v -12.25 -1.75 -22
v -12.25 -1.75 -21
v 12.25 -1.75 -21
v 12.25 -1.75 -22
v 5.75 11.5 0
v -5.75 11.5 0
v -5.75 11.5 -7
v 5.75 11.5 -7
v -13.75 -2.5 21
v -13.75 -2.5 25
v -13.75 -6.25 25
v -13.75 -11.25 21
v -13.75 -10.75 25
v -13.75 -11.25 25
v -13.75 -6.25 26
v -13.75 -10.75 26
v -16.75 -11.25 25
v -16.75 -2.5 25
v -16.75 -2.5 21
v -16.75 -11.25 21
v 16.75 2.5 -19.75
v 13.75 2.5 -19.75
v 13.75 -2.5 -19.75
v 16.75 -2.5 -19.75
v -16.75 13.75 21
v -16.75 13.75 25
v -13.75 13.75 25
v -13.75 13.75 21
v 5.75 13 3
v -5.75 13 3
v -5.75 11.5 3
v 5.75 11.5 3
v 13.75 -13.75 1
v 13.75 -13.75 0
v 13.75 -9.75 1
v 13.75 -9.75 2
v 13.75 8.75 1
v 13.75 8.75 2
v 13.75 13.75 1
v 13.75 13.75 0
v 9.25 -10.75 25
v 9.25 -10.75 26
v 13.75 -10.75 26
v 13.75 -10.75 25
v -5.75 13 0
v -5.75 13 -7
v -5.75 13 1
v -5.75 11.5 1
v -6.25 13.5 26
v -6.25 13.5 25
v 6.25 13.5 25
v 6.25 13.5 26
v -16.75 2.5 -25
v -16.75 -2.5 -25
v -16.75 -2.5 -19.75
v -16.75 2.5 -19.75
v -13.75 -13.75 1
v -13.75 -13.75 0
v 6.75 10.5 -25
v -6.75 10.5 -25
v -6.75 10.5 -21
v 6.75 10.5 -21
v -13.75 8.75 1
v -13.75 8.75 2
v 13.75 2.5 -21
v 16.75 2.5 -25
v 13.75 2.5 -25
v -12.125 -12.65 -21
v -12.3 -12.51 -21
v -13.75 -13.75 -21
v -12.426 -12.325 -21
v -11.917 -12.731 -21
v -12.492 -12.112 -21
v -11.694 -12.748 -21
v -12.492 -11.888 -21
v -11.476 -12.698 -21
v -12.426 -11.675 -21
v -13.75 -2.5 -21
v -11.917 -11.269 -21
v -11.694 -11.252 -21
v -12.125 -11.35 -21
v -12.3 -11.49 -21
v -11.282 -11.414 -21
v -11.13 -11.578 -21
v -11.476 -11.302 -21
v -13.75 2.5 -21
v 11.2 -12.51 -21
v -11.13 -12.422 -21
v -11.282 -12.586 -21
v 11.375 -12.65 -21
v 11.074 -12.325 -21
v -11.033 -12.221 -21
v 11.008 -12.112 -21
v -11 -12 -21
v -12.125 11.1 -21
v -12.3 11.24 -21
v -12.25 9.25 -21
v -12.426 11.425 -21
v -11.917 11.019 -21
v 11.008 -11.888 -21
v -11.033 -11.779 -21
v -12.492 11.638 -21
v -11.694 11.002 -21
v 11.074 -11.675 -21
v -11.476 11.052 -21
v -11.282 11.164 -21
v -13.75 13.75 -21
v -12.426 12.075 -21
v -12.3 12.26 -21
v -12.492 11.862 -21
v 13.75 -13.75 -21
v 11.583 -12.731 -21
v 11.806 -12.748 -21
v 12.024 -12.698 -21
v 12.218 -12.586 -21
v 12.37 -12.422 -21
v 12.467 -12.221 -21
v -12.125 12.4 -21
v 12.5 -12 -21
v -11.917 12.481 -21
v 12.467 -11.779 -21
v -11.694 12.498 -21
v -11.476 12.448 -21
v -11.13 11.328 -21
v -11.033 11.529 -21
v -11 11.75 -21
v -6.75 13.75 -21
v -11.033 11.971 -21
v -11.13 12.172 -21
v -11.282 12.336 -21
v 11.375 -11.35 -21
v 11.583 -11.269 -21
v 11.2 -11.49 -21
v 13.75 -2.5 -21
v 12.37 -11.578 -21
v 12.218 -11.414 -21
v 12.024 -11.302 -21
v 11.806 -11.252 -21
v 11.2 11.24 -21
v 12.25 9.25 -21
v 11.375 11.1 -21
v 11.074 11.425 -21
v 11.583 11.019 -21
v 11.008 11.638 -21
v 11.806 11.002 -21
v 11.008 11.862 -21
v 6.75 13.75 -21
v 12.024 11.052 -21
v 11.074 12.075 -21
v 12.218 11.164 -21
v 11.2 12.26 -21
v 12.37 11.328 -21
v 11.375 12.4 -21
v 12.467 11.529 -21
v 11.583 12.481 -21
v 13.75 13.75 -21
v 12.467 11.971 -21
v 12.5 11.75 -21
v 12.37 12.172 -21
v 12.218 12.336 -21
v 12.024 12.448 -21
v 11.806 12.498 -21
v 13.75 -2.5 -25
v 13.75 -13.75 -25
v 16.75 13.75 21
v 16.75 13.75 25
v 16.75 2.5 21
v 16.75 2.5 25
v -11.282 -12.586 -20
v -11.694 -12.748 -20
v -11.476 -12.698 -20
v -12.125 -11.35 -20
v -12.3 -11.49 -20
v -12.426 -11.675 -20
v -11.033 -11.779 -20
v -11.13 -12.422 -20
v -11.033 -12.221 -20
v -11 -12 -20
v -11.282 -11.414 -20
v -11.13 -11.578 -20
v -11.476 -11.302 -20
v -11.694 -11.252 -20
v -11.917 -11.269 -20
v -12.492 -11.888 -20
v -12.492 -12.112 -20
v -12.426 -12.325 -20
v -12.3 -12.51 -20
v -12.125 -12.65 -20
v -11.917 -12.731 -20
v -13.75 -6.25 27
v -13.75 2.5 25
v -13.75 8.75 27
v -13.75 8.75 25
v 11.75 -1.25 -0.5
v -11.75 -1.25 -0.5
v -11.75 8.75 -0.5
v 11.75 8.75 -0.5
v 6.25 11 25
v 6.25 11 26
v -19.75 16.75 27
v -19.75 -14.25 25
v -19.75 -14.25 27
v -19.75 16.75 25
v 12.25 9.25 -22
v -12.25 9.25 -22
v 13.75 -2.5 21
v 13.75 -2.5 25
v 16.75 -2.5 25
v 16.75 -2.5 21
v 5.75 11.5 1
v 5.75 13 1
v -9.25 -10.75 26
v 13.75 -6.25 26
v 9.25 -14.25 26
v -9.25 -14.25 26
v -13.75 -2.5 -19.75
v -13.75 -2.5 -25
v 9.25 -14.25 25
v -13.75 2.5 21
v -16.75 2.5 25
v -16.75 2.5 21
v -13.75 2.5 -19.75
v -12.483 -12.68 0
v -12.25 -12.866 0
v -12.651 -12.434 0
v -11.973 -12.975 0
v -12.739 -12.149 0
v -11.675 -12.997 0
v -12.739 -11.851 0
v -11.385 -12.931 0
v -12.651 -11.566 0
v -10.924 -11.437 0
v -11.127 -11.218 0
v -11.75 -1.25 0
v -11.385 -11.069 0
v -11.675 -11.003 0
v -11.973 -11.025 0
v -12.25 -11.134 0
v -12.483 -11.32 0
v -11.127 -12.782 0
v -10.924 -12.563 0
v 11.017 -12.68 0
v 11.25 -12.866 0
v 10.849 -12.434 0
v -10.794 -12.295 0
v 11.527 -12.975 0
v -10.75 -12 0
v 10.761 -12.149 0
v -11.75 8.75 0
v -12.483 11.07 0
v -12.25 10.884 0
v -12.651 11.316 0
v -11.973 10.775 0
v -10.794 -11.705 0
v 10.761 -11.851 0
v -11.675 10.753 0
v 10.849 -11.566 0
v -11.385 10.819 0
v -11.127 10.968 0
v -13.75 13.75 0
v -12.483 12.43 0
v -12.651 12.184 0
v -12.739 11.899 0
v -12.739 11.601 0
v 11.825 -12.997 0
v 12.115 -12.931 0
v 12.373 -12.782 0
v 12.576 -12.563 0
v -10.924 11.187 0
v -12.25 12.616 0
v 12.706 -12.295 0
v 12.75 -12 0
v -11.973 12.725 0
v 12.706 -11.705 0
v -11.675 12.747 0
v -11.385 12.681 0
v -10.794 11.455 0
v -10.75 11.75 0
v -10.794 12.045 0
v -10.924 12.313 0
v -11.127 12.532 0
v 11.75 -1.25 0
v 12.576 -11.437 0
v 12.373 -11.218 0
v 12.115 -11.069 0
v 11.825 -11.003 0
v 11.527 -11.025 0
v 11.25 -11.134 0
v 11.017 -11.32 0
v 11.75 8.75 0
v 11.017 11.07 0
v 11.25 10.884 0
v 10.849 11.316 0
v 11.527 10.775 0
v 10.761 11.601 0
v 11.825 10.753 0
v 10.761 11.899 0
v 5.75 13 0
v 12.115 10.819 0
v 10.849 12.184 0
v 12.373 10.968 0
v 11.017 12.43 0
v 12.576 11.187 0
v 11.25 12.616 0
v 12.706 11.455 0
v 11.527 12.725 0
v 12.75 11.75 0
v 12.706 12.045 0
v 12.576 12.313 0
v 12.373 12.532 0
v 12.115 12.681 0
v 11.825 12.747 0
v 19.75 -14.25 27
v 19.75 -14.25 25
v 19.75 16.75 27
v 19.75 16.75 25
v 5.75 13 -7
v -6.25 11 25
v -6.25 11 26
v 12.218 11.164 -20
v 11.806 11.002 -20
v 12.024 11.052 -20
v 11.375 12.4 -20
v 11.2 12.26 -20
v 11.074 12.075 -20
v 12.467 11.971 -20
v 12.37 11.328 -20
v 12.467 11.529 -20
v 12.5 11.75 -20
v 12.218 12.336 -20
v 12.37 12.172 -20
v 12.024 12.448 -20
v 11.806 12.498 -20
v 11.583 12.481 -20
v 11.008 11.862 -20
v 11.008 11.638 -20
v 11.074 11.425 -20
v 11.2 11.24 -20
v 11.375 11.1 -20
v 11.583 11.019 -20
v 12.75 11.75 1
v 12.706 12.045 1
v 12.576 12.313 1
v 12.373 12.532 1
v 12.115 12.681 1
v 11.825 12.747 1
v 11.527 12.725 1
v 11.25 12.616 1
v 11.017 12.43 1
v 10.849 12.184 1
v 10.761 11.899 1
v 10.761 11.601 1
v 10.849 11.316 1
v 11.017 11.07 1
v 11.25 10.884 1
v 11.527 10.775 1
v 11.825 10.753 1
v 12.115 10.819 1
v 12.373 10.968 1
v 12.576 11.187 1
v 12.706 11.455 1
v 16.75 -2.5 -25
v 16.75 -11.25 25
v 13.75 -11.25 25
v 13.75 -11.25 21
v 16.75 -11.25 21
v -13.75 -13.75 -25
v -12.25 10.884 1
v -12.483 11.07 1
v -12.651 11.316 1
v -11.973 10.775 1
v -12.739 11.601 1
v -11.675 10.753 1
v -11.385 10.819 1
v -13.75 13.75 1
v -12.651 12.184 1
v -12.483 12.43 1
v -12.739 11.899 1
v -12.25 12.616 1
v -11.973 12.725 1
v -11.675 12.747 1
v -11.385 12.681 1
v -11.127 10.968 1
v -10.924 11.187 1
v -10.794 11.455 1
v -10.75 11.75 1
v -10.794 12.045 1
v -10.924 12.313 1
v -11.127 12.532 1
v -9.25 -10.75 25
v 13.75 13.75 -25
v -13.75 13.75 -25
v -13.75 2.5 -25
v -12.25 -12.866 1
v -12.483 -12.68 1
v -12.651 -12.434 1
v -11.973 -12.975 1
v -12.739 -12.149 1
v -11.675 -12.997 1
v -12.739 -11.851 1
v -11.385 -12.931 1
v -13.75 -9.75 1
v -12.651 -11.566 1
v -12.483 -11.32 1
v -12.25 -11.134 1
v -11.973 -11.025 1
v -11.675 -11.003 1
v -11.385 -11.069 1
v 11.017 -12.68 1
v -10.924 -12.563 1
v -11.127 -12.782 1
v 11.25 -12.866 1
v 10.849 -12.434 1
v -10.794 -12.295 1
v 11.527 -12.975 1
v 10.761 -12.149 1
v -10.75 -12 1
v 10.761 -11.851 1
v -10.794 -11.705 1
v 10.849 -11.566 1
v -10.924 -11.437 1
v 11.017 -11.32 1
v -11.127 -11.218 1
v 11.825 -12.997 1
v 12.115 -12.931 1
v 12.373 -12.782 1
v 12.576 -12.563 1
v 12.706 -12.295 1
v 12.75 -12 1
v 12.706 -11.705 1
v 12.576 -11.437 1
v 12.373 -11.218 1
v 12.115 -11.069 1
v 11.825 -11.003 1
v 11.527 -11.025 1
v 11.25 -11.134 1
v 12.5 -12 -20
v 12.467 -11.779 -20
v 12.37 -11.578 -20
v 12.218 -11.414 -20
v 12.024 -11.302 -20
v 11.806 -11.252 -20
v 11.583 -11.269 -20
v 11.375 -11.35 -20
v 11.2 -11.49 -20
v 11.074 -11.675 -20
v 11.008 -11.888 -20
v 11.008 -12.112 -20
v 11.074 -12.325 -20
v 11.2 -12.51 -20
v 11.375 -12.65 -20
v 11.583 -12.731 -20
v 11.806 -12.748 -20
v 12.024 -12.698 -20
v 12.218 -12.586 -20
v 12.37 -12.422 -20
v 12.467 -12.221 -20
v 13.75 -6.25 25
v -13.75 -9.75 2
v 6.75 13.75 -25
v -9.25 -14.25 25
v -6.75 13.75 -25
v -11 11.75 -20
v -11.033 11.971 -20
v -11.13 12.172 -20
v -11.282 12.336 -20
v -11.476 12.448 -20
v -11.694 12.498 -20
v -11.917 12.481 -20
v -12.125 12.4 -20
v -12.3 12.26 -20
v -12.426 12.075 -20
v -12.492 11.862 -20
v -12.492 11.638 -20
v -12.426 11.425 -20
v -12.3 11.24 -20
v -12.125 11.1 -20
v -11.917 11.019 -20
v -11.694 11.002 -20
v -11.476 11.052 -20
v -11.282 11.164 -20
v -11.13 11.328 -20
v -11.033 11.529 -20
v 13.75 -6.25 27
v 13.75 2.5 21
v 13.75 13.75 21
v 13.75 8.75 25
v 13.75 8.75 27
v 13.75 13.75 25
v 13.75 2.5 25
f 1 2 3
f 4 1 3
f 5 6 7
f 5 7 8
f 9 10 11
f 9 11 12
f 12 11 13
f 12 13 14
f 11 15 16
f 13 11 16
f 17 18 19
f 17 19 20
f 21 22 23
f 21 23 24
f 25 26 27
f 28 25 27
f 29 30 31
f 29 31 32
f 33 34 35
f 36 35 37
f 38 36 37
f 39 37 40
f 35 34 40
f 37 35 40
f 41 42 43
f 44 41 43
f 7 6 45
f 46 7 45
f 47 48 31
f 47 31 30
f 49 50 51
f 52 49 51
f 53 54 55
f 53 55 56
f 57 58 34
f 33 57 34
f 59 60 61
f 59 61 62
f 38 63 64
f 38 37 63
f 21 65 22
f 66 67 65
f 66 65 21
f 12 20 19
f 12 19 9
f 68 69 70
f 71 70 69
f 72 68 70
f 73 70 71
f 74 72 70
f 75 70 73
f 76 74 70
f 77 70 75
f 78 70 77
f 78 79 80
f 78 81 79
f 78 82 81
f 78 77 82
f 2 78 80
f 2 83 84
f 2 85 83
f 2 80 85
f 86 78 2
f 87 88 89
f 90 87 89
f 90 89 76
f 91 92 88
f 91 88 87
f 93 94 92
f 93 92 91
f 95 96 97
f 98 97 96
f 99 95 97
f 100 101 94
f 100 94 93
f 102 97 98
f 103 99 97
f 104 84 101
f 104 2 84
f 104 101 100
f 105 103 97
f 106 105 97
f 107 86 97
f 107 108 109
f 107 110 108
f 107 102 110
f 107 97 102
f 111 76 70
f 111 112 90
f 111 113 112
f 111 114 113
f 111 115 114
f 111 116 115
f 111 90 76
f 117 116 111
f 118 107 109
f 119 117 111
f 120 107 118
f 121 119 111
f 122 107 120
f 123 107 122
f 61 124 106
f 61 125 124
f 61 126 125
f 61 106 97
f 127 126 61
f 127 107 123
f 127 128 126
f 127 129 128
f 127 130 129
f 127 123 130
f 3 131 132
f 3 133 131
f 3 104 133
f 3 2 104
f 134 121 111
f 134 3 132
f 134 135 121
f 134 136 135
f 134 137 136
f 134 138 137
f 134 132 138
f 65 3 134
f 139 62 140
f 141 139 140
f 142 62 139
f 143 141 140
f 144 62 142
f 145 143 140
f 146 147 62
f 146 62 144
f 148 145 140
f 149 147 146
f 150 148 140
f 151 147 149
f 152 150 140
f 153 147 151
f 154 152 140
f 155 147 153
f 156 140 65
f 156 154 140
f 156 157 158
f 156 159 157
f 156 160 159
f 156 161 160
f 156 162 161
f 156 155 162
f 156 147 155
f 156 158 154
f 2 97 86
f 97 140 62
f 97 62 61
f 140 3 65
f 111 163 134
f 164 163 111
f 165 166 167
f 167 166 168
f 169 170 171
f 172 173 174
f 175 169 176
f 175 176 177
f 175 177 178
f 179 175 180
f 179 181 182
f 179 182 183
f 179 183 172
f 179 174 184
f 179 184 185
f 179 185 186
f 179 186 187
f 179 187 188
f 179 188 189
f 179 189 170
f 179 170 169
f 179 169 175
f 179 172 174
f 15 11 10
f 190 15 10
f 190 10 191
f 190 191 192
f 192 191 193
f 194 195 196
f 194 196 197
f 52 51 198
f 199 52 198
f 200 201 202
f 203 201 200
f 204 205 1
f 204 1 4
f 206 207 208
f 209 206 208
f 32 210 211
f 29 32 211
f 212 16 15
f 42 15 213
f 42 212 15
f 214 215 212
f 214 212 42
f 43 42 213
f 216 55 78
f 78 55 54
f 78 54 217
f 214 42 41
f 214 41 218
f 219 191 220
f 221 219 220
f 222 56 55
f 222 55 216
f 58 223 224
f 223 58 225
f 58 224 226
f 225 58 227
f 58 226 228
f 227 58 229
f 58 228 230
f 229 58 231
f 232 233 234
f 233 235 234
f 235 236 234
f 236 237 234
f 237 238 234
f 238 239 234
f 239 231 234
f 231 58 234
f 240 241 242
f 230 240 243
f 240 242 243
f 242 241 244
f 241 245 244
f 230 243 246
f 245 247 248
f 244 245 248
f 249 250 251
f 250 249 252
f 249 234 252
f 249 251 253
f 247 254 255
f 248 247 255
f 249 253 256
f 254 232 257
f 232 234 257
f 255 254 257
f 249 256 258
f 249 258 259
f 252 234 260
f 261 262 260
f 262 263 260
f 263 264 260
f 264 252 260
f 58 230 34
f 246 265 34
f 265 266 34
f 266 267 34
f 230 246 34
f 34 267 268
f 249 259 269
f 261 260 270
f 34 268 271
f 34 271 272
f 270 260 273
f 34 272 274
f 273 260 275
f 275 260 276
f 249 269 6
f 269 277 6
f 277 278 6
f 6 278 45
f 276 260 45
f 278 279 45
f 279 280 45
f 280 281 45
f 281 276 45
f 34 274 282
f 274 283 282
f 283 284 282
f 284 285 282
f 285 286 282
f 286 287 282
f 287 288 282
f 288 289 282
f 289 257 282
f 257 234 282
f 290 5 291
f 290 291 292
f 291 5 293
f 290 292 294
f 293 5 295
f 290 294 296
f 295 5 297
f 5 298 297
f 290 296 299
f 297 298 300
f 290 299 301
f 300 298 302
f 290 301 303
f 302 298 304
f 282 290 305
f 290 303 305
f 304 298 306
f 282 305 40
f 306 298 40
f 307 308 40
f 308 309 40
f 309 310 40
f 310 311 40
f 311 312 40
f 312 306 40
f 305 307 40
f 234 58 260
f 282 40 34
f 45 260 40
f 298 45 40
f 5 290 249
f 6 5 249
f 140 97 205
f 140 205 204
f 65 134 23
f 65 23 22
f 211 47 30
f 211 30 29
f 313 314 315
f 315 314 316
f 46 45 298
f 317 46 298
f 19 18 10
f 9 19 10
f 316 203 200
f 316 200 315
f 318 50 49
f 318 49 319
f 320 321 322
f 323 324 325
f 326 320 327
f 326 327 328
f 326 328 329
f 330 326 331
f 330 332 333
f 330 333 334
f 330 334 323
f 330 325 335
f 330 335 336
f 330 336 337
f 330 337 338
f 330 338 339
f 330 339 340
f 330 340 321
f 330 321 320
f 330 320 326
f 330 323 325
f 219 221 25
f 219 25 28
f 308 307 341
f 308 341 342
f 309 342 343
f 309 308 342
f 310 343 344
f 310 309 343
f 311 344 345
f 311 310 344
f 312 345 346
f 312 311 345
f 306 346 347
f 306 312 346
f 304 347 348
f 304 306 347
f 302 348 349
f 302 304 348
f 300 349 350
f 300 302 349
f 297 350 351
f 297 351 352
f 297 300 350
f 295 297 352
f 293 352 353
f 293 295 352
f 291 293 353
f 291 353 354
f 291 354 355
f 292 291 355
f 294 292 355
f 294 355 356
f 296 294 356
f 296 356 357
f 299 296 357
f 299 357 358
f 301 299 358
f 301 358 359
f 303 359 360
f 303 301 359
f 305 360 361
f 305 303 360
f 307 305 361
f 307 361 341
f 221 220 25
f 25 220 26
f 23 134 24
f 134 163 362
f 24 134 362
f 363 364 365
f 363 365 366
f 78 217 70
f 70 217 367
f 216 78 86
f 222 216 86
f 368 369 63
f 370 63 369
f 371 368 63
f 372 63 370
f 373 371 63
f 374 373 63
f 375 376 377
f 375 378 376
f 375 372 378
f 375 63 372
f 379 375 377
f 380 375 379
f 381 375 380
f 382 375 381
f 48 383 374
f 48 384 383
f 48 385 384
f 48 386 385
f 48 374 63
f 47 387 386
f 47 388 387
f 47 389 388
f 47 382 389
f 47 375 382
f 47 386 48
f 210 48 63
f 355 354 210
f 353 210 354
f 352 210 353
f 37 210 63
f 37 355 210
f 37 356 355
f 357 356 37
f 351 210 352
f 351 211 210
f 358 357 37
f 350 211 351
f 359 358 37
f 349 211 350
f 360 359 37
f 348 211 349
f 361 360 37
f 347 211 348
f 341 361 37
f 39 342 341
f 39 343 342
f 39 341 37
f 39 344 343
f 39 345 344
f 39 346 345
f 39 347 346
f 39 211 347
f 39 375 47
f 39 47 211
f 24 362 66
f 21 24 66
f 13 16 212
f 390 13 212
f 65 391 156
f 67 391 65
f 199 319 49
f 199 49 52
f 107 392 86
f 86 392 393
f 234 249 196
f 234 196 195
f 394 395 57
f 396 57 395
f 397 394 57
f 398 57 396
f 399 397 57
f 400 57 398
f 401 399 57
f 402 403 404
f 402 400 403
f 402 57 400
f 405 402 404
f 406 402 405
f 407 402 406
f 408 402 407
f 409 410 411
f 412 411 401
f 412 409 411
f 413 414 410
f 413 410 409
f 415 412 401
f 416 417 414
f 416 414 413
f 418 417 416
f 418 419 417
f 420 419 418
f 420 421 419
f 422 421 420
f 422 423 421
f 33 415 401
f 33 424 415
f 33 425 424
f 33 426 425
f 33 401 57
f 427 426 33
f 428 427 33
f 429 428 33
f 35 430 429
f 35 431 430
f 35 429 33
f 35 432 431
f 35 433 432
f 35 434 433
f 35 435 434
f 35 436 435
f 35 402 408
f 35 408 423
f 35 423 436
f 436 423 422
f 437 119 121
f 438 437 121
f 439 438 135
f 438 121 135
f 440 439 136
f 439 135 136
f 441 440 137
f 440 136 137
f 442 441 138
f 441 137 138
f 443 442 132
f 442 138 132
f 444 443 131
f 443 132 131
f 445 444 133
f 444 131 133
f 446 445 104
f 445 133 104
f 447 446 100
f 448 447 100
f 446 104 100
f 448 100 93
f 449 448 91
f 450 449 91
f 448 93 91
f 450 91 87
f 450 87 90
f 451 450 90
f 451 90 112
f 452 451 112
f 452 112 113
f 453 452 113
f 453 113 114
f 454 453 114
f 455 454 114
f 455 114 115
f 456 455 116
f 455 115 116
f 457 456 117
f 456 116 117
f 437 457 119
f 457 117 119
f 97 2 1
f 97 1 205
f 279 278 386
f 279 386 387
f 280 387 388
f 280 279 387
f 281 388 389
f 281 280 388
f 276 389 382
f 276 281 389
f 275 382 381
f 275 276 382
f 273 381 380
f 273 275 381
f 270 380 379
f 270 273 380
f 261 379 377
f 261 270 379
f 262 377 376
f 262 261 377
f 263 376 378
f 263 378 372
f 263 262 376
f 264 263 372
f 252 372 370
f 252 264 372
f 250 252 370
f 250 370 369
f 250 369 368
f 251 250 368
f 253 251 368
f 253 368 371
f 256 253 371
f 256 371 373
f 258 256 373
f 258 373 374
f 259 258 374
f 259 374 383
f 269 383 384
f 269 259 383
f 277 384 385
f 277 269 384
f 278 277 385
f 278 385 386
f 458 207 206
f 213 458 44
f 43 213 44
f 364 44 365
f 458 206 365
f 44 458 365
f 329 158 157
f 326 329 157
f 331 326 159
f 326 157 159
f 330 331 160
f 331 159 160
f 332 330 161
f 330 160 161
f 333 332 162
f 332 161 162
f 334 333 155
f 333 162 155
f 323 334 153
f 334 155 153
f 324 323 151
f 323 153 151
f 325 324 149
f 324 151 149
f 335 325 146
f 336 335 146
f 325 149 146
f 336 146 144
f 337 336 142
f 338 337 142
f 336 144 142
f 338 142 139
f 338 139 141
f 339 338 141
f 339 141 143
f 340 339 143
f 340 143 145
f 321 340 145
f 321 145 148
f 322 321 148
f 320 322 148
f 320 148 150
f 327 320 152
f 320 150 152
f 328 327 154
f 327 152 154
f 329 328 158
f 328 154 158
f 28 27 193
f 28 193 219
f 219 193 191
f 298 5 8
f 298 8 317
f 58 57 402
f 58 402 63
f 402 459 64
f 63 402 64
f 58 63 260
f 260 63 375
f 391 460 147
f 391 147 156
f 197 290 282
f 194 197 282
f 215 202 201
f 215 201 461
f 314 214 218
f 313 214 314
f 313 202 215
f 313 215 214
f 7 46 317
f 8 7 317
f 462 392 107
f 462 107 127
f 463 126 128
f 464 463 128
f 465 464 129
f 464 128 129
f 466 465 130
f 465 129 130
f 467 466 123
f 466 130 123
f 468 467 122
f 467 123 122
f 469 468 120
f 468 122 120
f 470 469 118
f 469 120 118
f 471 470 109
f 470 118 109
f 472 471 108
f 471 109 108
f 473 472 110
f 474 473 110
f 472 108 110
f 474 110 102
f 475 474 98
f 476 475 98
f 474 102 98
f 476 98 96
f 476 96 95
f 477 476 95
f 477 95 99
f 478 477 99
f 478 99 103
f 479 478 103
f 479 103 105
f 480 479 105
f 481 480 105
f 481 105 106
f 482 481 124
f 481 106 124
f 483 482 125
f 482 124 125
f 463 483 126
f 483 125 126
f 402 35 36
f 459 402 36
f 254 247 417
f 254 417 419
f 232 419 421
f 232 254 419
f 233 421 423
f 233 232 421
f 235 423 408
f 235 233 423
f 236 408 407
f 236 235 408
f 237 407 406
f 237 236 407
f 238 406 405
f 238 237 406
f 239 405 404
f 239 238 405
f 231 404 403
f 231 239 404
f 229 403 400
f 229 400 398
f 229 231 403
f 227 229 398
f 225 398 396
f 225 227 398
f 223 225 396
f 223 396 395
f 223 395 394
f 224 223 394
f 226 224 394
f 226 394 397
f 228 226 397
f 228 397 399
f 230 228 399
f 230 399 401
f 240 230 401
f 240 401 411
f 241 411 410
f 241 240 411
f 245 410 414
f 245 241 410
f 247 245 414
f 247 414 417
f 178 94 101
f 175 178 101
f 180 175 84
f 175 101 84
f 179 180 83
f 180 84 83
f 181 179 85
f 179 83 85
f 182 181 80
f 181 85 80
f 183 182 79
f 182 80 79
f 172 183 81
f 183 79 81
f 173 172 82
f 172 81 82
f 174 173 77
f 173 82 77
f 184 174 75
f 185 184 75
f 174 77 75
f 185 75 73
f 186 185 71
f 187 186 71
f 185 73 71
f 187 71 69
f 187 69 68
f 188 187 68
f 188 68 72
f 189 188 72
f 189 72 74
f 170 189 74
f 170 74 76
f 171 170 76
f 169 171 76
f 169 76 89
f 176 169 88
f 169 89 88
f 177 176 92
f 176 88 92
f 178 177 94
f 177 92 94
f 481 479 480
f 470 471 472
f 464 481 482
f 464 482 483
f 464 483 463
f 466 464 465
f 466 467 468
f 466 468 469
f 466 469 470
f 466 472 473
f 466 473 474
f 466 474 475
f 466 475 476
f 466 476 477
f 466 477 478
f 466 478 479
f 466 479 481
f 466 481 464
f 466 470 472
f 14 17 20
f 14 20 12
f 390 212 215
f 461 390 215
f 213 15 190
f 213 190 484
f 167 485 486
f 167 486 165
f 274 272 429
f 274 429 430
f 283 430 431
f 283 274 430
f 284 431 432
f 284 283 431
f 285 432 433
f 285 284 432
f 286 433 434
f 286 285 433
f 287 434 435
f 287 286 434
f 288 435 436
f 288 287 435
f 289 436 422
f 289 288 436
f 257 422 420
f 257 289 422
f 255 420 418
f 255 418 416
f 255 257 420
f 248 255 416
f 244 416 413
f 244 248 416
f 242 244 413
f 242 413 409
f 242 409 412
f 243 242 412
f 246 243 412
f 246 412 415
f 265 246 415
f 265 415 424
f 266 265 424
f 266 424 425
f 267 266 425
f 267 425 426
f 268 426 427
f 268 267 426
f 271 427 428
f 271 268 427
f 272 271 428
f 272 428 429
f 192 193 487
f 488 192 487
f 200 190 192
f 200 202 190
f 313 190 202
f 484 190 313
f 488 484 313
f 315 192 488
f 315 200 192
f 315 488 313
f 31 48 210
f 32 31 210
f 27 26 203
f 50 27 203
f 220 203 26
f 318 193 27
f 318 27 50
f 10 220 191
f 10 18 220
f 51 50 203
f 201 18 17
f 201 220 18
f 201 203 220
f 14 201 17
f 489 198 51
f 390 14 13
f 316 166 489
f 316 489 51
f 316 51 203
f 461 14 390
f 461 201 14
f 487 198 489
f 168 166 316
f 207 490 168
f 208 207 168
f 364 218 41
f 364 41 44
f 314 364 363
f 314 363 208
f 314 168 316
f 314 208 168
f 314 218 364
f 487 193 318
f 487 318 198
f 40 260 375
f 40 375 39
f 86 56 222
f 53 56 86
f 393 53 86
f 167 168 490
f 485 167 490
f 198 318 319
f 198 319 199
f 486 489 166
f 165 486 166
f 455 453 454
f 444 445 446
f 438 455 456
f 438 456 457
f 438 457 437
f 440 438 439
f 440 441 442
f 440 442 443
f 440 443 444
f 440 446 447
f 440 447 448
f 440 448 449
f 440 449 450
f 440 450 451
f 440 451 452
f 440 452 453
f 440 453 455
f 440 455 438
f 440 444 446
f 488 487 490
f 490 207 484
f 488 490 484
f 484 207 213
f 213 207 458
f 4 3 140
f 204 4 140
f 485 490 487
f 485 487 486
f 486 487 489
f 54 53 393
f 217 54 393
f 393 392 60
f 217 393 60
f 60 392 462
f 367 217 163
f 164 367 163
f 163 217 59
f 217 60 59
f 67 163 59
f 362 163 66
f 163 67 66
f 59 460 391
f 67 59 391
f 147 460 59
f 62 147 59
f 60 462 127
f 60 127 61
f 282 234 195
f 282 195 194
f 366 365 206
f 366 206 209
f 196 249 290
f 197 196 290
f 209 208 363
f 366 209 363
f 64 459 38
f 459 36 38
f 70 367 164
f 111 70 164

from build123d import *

# Parameters (mm, degrees)
F0_W          = 27.5
F0_H          = 27.5
F0_R          = 1
F1_DEPTH      = 1
F2_W          = 18.5
F2_H          = 1
F3_DEPTH      = 13.75
F3_DEPTH_BACK = 13.75
F4_W          = 11.5
F4_H          = 1.5
F5_DEPTH      = 2
F5_DEPTH_BACK = 8
F6_W          = 23.5
F6_H          = 10
F7_DEPTH      = 0.5
F9_W          = 39.5
F9_H          = 31
F9_W_2        = 27.5000000002
F9_H_2        = 3.5
F10_DEPTH     = 2
F11_W         = 27.5
F11_H         = 3.5
F11_H_2       = 4.5
F11_W_2       = 12.5
F11_H_3       = 2.5
F11_W_3       = 11.5
F11_H_4       = 1.5
F12_DEPTH     = 1
F13_W         = 3
F13_H         = 8.75
F14_DEPTH     = 4
F15_W         = 4.5
F15_H         = 3.5
F16_DEPTH     = 1
F18_W         = 33.5
F18_H         = 27.5
F19_DEPTH     = 4
F20_R         = 0.75
F21_DEPTH     = 1
F22_W         = 3
F22_H         = 5
F23_DEPTH     = 1.25
F24_W         = 3
F24_H         = 11.25
F24_W_2       = 13.5
F24_H_2       = 3.25
F25_DEPTH     = 4
F26_W         = 24.5
F26_H         = 11
F27_DEPTH     = 1


with BuildPart() as f1:
    # F0 (on Top) → F1 (new body)
    with BuildSketch(Plane.XY):
        Rectangle(F0_W, F0_H)
        with Locations((-11.75, -12)):
            Circle(F0_R, mode=Mode.SUBTRACT)
        with Locations((11.75, -12)):
            Circle(F0_R, mode=Mode.SUBTRACT)
        with Locations((-11.75, 11.75)):
            Circle(F0_R, mode=Mode.SUBTRACT)
        with Locations((11.75, 11.75)):
            Circle(F0_R, mode=Mode.SUBTRACT)
    extrude(amount=F1_DEPTH)

    # F2 (on Right) → F3 (join, two sides)
    with BuildSketch(Plane.YZ) as f3_sk:
        with Locations((-0.5, 1.5)):
            Rectangle(F2_W, F2_H)
    extrude(amount=F3_DEPTH)
    extrude(f3_sk.sketch, amount=-F3_DEPTH_BACK)

    # F4 (on face) → F5 (join, two sides)
    with BuildSketch(Plane.XY.offset(1)) as f5_sk:
        with Locations((0, 12.25)):
            Rectangle(F4_W, F4_H)
    extrude(amount=F5_DEPTH)
    extrude(f5_sk.sketch, amount=-F5_DEPTH_BACK)

    # F6 (on face) → F7 (join)
    with BuildSketch(Plane(origin=(0, 0, 0), x_dir=(1, 0, 0), z_dir=(0, 0, -1))):
        with Locations((0, -3.75)):
            Rectangle(F6_W, F6_H)
    extrude(amount=F7_DEPTH)


with BuildPart() as f10:
    # F9 (on offset) → F10 (new body)
    with BuildSketch(Plane.XY.offset(25)):
        with Locations((0, 1.25)):
            Rectangle(F9_W, F9_H)
        Polygon((-13.7499999998, 8.75), (13.7500000002, 8.75), (13.75, -6.25), (13.75, -9.75), (-13.7499999998, -9.75), (-13.75, -6.25), align=None, mode=Mode.SUBTRACT)
        with Locations((1e-10, -8)):
            Rectangle(F9_W_2, F9_H_2)
    extrude(amount=F10_DEPTH)

    # F11 (on face) → F12 (cut)
    with BuildSketch(Plane(origin=(0, 0, 25), x_dir=(1, 0, 0), z_dir=(0, 0, -1))):
        with Locations((0, 8)):
            Rectangle(F11_W, F11_H)
        with Locations((0, 12)):
            Rectangle(F11_W, F11_H_2)
        with Locations((0, -12.25)):
            Rectangle(F11_W_2, F11_H_3)
        with Locations((0, -12.25)):
            Rectangle(F11_W_3, F11_H_4, mode=Mode.SUBTRACT)
        with Locations((0, -12.25)):
            Rectangle(F11_W_3, F11_H_4)
    extrude(amount=-F12_DEPTH, mode=Mode.SUBTRACT)

    # F13 (on face) → F14 (join)
    with BuildSketch(Plane(origin=(0, 0, 25), x_dir=(1, 0, 0), z_dir=(0, 0, -1))):
        with Locations((-15.25, 6.875)):
            Rectangle(F13_W, F13_H)
        Polygon((16.75, -2.5), (13.75, -2.5), (13.75, -8.75), (13.75, -13.75), (16.75, -13.75), align=None)
        Polygon((-13.75, -8.75), (-13.75, -2.5), (-16.75, -2.5), (-16.75, -13.75), (-13.75, -13.75), align=None)
        with Locations((15.25, 6.875)):
            Rectangle(F13_W, F13_H)
    extrude(amount=F14_DEPTH)

    # F15 (on face) → F16 (join, through all)
    with BuildSketch(Plane(origin=(0, 0, 26), x_dir=(1, 0, 0), z_dir=(0, 0, -1))):
        with Locations((-11.5, 12.5)):
            Rectangle(F15_W, F15_H)
        with Locations((11.5, 12.5)):
            Rectangle(F15_W, F15_H)
    extrude(amount=F16_DEPTH)


with BuildPart() as f19:
    # F18 (on offset) → F19 (new body)
    with BuildSketch(Plane.XY.offset(-25)):
        Rectangle(F18_W, F18_H)
    extrude(amount=F19_DEPTH)

    # F20 (on face) → F21 (join)
    with BuildSketch(Plane.XY.offset(-21)):
        with Locations((-11.75, -12)):
            Circle(F20_R)
        with Locations((11.75, -12)):
            Circle(F20_R)
        with Locations((11.75, 11.75)):
            Circle(F20_R)
        with Locations((-11.75, 11.75)):
            Circle(F20_R)
    extrude(amount=F21_DEPTH)

    # F22 (on face) → F23 (join)
    with BuildSketch(Plane.XY.offset(-21)):
        with Locations((-15.25, 0)):
            Rectangle(F22_W, F22_H)
        with Locations((15.25, 0)):
            Rectangle(F22_W, F22_H)
    extrude(amount=F23_DEPTH)

    # F24 (on face) → F25 (cut, through all)
    with BuildSketch(Plane(origin=(0, 0, -25), x_dir=(1, 0, 0), z_dir=(0, 0, -1))):
        with Locations((-15.25, 8.125)):
            Rectangle(F24_W, F24_H)
        with Locations((15.25, -8.125)):
            Rectangle(F24_W, F24_H)
        with Locations((-15.25, -8.125)):
            Rectangle(F24_W, F24_H)
        with Locations((15.25, 8.125)):
            Rectangle(F24_W, F24_H)
        with Locations((0, -12.125)):
            Rectangle(F24_W_2, F24_H_2)
    extrude(amount=-F25_DEPTH, mode=Mode.SUBTRACT)

    # F26 (on face) → F27 (cut)
    with BuildSketch(Plane.XY.offset(-21)):
        with Locations((0, 3.75)):
            Rectangle(F26_W, F26_H)
    extrude(amount=-F27_DEPTH, mode=Mode.SUBTRACT)


solid = Compound([f1.part, f10.part, f19.part])
